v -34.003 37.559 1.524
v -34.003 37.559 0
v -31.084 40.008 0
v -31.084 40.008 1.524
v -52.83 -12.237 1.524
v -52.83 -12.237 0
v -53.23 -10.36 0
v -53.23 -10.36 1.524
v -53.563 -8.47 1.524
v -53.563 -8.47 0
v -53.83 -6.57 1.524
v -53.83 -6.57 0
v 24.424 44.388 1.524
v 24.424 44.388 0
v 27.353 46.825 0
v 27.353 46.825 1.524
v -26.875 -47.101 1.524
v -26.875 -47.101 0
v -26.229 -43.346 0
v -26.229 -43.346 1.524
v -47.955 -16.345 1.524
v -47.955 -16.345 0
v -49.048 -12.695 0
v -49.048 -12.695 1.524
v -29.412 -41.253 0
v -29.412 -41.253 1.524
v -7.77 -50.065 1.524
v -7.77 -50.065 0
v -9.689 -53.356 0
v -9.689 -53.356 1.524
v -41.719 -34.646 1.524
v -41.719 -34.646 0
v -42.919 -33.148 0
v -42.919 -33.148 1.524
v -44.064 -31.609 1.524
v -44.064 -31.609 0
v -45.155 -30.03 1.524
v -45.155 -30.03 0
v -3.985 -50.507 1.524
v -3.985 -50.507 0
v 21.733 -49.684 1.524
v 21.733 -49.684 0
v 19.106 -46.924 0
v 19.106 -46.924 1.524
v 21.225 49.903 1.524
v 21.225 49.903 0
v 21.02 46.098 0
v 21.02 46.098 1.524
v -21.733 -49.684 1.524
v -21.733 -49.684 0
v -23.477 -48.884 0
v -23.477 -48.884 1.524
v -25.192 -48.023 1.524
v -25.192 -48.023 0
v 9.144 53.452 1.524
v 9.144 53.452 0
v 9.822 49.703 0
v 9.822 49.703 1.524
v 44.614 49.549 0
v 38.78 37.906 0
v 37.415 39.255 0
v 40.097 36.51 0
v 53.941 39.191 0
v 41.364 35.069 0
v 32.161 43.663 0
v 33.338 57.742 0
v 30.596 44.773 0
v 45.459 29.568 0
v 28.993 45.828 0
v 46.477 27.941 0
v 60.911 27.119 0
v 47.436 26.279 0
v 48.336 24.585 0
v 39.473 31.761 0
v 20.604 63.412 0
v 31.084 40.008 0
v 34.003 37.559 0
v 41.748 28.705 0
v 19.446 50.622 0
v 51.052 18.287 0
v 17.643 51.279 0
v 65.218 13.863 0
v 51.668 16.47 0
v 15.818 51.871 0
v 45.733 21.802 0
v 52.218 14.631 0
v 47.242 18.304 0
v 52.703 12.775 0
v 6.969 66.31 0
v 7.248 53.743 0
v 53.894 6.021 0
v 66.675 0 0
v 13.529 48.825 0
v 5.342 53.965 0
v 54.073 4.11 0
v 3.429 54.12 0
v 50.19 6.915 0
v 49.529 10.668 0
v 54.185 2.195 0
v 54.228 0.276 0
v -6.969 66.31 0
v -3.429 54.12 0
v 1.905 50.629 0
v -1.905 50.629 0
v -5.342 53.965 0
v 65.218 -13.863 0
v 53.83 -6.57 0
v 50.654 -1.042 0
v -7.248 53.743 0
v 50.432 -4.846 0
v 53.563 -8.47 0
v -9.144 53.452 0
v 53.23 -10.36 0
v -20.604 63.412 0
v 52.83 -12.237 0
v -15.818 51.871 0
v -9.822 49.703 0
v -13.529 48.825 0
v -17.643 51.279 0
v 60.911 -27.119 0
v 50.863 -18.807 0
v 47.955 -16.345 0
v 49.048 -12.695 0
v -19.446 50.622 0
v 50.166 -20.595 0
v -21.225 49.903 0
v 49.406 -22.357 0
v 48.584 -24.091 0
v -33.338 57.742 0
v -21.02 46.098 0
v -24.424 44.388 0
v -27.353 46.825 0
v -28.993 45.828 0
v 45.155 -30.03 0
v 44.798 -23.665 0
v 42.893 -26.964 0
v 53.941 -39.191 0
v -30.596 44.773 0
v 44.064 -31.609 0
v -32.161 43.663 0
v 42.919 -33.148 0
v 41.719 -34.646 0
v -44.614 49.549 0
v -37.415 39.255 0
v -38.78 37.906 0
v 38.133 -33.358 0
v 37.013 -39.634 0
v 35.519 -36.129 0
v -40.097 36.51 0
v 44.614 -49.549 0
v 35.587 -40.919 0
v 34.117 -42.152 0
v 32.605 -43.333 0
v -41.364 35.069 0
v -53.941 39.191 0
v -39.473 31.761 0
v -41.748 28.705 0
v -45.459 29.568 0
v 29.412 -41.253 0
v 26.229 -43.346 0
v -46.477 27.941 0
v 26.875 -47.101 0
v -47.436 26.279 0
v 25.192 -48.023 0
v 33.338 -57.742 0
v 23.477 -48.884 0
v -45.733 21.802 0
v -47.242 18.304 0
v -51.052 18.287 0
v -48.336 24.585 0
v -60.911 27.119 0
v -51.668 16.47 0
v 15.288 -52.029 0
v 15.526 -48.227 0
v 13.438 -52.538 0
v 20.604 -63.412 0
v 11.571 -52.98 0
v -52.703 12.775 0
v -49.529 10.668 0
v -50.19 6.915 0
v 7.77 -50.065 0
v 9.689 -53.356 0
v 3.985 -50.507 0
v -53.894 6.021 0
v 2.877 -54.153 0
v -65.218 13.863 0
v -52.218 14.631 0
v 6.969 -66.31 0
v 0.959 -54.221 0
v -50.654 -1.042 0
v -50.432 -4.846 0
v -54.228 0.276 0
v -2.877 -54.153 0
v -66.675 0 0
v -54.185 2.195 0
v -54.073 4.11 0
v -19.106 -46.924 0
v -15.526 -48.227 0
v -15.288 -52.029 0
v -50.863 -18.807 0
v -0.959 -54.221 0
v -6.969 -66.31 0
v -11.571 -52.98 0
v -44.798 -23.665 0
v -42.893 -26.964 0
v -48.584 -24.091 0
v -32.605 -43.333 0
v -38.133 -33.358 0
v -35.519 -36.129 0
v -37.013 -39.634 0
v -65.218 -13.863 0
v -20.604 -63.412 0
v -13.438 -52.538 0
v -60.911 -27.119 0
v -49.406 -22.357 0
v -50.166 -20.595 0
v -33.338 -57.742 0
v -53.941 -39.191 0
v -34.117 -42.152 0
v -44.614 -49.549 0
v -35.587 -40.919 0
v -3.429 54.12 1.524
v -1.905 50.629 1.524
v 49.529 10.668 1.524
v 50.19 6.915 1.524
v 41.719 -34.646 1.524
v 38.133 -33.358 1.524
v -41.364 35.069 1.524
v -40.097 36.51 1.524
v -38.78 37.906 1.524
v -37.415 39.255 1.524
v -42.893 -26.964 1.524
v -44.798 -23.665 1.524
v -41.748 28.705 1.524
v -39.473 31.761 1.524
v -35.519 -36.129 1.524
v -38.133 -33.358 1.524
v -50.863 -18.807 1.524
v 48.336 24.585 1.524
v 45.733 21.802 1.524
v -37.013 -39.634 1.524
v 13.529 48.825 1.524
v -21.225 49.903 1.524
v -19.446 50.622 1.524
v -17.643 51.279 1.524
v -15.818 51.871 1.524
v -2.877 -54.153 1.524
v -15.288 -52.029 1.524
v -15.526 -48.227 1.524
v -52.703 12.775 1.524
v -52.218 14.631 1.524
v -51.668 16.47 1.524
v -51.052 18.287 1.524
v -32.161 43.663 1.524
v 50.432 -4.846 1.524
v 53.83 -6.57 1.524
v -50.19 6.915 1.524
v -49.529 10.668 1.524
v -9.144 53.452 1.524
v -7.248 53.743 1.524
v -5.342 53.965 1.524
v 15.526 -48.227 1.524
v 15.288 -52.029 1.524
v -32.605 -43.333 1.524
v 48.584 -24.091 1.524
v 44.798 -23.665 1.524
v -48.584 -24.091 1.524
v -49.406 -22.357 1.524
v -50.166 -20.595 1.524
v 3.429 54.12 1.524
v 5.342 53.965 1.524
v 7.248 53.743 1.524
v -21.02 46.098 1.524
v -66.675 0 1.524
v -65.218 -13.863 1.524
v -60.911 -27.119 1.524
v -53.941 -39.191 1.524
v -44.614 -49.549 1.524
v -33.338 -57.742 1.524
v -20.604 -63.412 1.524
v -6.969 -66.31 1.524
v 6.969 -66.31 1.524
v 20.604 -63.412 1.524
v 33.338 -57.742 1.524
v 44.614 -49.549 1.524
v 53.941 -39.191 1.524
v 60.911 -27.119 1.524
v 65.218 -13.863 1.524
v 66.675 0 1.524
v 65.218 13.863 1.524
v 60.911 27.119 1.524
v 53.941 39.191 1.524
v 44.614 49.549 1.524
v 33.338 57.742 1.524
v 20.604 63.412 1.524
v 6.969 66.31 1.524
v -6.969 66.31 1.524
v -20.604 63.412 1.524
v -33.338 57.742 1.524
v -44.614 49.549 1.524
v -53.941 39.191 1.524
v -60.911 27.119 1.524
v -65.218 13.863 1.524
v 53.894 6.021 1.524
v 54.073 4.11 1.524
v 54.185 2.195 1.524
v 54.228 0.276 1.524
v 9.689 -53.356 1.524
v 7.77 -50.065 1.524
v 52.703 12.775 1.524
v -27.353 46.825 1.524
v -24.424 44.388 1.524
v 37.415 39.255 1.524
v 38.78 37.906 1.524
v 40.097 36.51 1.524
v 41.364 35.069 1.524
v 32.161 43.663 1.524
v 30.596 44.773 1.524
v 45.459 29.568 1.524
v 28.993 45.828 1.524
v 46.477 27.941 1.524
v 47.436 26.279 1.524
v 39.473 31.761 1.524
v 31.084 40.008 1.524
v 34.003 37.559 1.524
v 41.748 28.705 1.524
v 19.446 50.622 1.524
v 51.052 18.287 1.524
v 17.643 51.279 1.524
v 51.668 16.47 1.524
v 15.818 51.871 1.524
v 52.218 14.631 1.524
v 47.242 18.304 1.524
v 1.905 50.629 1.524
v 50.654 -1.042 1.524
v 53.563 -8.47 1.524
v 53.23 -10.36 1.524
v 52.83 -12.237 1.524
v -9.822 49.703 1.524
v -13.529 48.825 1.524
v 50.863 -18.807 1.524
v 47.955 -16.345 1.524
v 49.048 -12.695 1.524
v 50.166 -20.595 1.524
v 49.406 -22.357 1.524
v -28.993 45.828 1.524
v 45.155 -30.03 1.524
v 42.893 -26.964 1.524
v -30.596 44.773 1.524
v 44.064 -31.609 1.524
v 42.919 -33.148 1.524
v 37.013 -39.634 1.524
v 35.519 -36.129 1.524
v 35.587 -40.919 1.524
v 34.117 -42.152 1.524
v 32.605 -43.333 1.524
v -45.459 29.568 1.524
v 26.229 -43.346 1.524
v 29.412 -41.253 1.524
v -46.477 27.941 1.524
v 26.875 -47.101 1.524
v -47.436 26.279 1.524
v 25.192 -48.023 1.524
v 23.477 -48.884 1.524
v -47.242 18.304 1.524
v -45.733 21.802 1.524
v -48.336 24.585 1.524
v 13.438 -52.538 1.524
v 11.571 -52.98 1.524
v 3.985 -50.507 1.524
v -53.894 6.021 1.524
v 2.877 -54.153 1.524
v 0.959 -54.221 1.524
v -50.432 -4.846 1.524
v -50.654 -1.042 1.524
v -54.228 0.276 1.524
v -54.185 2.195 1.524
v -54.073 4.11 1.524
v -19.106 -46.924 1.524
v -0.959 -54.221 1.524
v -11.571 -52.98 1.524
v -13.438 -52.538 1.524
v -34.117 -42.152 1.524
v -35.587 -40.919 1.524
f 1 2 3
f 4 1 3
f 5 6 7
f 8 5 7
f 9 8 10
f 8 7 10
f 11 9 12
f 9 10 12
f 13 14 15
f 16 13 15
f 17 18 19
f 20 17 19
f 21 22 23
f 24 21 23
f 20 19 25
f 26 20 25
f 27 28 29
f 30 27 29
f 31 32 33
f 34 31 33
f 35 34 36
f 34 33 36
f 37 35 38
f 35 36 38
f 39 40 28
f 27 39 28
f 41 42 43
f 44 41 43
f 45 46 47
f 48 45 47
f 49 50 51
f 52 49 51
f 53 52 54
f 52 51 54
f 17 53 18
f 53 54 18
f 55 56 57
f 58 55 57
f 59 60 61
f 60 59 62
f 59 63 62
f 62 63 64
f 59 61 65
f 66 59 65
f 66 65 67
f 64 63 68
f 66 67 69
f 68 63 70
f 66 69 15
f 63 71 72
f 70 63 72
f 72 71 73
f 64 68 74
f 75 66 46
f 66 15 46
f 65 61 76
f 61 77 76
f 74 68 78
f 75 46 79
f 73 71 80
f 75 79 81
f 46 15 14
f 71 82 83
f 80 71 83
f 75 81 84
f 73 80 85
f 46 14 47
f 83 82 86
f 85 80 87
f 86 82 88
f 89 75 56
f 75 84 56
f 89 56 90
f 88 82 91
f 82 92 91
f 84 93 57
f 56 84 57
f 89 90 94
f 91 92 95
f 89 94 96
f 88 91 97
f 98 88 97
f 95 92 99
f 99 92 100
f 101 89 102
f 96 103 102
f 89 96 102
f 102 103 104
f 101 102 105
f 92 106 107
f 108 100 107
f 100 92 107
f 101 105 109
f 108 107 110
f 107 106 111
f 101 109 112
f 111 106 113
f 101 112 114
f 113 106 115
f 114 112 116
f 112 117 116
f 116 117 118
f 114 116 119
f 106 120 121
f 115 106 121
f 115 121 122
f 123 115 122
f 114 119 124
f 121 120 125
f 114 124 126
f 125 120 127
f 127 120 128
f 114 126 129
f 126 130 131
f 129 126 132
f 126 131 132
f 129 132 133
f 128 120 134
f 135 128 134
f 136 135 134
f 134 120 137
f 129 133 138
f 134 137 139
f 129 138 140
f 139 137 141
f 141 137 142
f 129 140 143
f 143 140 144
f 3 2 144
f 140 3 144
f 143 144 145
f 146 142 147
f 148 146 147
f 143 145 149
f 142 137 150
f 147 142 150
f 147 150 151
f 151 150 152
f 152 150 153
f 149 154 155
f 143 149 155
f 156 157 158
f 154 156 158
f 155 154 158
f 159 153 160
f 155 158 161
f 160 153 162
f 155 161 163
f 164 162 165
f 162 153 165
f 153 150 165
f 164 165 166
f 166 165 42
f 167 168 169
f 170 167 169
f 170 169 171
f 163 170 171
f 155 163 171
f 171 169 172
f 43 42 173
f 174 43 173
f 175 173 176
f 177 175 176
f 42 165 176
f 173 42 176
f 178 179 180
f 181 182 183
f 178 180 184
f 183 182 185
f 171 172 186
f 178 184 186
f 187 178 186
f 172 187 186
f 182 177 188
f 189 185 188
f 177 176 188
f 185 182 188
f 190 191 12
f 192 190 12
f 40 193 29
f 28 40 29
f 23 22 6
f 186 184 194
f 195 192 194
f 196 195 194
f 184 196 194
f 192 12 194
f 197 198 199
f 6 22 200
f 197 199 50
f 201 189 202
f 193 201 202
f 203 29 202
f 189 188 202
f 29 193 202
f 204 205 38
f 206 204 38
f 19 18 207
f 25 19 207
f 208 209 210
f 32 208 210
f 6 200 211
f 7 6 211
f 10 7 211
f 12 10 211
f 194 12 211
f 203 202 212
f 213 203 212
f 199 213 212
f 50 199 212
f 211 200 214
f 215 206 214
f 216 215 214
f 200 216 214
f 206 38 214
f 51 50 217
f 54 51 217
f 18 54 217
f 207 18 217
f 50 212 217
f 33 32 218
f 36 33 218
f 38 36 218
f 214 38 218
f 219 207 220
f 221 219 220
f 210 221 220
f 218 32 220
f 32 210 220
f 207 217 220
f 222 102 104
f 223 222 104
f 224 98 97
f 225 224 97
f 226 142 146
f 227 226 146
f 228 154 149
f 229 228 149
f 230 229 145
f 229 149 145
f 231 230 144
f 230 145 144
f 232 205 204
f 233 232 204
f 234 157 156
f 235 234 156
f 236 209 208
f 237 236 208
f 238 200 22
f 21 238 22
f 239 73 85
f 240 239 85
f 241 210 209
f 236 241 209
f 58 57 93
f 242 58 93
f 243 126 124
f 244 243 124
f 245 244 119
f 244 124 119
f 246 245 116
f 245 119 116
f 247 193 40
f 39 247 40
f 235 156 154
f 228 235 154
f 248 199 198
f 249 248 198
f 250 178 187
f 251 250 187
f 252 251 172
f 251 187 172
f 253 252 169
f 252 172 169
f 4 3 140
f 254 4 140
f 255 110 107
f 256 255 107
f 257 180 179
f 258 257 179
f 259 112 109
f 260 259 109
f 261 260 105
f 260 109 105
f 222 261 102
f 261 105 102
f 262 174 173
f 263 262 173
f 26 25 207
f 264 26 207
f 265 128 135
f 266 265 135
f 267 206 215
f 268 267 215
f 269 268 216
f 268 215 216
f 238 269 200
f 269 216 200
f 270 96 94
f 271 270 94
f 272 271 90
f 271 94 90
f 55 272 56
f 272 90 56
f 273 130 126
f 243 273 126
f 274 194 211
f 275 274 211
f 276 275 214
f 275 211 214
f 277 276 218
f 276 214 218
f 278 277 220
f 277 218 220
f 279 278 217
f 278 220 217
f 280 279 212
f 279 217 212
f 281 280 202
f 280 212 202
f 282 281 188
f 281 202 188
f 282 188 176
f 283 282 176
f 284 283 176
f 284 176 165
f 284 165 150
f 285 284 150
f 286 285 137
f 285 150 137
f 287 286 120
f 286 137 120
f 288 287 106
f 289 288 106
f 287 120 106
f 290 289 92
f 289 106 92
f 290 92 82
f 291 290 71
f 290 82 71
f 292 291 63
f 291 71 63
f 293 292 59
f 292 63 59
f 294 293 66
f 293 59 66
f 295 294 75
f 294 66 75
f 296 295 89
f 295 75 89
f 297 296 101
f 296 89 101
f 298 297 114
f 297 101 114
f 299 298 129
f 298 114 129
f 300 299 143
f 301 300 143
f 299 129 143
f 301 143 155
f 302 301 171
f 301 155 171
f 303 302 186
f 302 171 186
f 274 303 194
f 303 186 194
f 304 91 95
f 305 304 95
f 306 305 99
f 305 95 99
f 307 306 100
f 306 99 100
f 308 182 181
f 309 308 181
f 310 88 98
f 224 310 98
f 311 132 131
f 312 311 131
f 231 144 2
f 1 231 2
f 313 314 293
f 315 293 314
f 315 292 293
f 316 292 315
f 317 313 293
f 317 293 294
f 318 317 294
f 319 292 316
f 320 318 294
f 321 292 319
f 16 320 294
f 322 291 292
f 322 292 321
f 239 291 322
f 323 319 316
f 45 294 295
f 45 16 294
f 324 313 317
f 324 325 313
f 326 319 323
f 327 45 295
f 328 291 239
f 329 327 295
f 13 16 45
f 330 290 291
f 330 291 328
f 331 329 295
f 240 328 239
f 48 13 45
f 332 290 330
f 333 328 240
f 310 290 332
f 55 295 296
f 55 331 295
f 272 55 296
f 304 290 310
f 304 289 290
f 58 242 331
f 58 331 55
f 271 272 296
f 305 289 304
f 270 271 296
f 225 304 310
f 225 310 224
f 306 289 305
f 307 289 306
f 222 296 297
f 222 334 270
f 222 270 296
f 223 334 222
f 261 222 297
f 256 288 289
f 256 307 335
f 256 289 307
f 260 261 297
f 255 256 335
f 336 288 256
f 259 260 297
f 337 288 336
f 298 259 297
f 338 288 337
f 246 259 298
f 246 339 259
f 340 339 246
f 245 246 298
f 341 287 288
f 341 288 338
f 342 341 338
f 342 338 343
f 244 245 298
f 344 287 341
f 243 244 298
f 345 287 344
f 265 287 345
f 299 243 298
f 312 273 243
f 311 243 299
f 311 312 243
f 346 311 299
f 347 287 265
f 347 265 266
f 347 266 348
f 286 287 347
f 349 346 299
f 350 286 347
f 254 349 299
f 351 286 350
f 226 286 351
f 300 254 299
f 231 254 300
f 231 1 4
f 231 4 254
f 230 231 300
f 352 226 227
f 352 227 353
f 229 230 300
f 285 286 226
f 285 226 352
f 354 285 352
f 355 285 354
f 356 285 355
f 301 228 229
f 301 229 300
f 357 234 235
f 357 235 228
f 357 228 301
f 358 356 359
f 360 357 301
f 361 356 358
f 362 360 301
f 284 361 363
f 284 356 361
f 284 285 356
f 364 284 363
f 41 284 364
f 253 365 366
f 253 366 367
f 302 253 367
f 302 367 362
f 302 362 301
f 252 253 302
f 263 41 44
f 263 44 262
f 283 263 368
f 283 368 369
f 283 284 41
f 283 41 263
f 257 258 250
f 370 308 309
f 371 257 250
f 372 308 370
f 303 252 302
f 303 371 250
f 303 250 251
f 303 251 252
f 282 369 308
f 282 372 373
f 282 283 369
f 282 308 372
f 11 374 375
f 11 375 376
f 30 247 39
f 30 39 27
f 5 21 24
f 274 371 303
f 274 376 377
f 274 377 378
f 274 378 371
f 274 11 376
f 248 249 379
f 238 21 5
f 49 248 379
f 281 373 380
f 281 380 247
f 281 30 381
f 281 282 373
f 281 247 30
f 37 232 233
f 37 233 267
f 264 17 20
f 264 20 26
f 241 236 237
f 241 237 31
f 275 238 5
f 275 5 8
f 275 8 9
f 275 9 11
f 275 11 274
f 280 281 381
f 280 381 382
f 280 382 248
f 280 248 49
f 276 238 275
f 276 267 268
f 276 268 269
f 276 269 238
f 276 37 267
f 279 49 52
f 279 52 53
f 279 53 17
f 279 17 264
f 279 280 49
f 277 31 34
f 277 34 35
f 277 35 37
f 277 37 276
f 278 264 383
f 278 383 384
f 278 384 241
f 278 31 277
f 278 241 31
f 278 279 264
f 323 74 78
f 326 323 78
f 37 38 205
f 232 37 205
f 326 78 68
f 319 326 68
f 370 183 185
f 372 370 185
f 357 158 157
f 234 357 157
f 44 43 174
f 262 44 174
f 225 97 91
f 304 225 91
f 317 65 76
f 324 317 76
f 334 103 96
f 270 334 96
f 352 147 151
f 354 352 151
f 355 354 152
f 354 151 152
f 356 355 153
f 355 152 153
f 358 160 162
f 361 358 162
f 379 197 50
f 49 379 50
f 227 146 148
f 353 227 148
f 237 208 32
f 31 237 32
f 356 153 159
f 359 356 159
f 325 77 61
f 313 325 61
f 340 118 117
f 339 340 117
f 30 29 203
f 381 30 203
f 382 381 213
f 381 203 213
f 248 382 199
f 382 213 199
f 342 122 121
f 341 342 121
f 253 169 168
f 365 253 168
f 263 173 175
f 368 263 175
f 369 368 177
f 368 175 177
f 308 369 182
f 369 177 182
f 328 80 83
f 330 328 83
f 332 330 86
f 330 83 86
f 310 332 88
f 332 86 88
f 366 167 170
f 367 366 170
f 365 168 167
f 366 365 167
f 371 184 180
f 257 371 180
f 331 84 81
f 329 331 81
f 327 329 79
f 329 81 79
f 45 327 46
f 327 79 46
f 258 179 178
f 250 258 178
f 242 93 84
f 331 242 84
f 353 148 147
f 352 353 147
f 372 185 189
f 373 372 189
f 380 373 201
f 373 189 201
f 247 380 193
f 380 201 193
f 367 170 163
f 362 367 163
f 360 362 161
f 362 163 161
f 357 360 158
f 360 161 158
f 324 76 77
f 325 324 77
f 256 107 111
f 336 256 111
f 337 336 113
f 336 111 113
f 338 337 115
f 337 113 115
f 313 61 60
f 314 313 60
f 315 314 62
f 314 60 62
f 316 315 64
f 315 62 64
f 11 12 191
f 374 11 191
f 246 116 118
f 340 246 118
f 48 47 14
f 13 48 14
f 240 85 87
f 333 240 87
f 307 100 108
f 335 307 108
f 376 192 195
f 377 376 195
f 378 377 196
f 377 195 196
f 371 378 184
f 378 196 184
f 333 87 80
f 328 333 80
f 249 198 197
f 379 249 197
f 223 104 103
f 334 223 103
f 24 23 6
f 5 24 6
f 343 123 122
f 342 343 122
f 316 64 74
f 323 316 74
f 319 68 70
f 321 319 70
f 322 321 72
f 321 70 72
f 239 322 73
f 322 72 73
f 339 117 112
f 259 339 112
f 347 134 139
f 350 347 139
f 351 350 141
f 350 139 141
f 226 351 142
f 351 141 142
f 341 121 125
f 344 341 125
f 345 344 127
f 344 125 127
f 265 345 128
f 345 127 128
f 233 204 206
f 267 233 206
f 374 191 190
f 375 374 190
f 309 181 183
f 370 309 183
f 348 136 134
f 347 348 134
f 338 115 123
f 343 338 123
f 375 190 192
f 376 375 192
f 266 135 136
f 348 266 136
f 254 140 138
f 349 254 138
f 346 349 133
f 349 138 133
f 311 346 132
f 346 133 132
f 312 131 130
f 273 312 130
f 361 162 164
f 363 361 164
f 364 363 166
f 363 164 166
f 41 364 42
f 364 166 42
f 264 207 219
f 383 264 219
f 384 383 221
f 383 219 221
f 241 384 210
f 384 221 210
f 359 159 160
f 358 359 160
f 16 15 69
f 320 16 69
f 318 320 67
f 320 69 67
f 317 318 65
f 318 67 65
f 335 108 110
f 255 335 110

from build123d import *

# Parameters (mm, degrees)
SKETCH1_R           = 66.675
BOSS_EXTRUDE1_DEPTH = 1.524


with BuildPart() as part:
    # Sketch1 → Boss-Extrude1 (new body)
    with BuildSketch(Plane.XY):
        with Locations(Location((0, 0, 0), (0, 0, 180))):
            Circle(SKETCH1_R)
        with BuildLine():
            Line((-3.429, 54.120480412), (-1.905, 50.628557732))
            Line((-1.905, 50.628557732), (1.905, 50.628557732))
            Line((1.905, 50.628557732), (3.429, 54.120480412))
            ThreePointArc((3.429, 54.120480412), (6.29560264, 53.862322902), (9.144470854, 53.452437679))
            Line((9.144470854, 53.452437679), (9.822098447, 49.70318164))
            Line((9.822098447, 49.70318164), (13.529399404, 48.824535172))
            Line((13.529399404, 48.824535172), (15.817612576, 51.870874037))
            ThreePointArc((15.817612576, 51.870874037), (18.547410352, 50.958591133), (21.224960917, 49.902760195))
            Line((21.224960917, 49.902760195), (21.019685025, 46.09829416))
            Line((21.019685025, 46.09829416), (24.424425385, 44.388369284))
            Line((24.424425385, 44.388369284), (27.353493565, 46.824895417))
            ThreePointArc((27.353493565, 46.824895417), (29.799322372, 45.307668525), (32.161207844, 43.662811992))
            Line((32.161207844, 43.662811992), (31.084094942, 40.00823571))
            Line((31.084094942, 40.00823571), (34.002724271, 37.559214917))
            Line((34.002724271, 37.559214917), (37.414740634, 39.254574565))
            ThreePointArc((37.414740634, 39.254574565), (39.444745209, 37.21419778), (41.36363573, 35.068990293))
            Line((41.36363573, 35.068990293), (39.472753256, 31.761322918))
            Line((39.472753256, 31.761322918), (41.74792749, 28.705233553))
            Line((41.74792749, 28.705233553), (45.458949352, 29.568029437))
            ThreePointArc((45.458949352, 29.568029437), (46.963691622, 27.1145), (48.336139308, 24.58459025))
            Line((48.336139308, 24.58459025), (45.733425224, 21.802148985))
            Line((45.733425224, 21.802148985), (47.242489132, 18.303745618))
            Line((47.242489132, 18.303745618), (51.052454344, 18.287464189))
            ThreePointArc((51.052454344, 18.287464189), (51.950813263, 15.553052507), (52.702829105, 12.774828583))
            Line((52.702829105, 12.774828583), (49.5285964, 10.667615558))
            Line((49.5285964, 10.667615558), (50.190195957, 6.915498019))
            Line((50.190195957, 6.915498019), (53.893708307, 6.021017013))
            ThreePointArc((53.893708307, 6.021017013), (54.137253115, 3.153135927), (54.228295743, 0.276372601))
            Line((54.228295743, 0.276372601), (50.653668125, -1.042011786))
            Line((50.653668125, -1.042011786), (50.432136326, -4.845565869))
            Line((50.432136326, -4.845565869), (53.829538506, -6.570024749))
            ThreePointArc((53.829538506, -6.570024749), (53.405139638, -9.416767027), (52.830300921, -12.2369827))
            Line((52.830300921, -12.2369827), (49.047987489, -12.695464004))
            Line((49.047987489, -12.695464004), (47.955267173, -16.345404046))
            Line((47.955267173, -16.345404046), (50.863404351, -18.806874776))
            ThreePointArc((50.863404351, -18.806874776), (49.79394126, -21.479009633), (48.584210902, -24.090639096))
            Line((48.584210902, -24.090639096), (44.798117153, -23.664500472))
            Line((44.798117153, -23.664500472), (42.893117153, -26.96405726))
            Line((42.893117153, -26.96405726), (45.155210902, -30.029841315))
            ThreePointArc((45.155210902, -30.029841315), (43.49833862, -32.383313269), (41.718933497, -34.645562903))
            Line((41.718933497, -34.645562903), (38.133168725, -33.357777594))
            Line((38.133168725, -33.357777594), (35.518588085, -36.129071168))
            Line((35.518588085, -36.129071168), (37.012688345, -39.633891337))
            ThreePointArc((37.012688345, -39.633891337), (34.857729286, -41.541824106), (32.604577589, -43.332735446))
            Line((32.604577589, -43.332735446), (29.412451301, -41.252728291))
            Line((29.412451301, -41.252728291), (26.22924274, -43.346357498))
            Line((26.22924274, -43.346357498), (26.874802178, -47.101268018))
            ThreePointArc((26.874802178, -47.101268018), (24.337930743, -48.460804452), (21.732500464, -49.683829005))
            Line((21.732500464, -49.683829005), (19.106101015, -46.923733729))
            Line((19.106101015, -46.923733729), (15.525872129, -48.226830475))
            Line((15.525872129, -48.226830475), (15.288088471, -52.029403148))
            ThreePointArc((15.288088471, -52.029403148), (12.506068054, -52.767250287), (9.688818614, -53.356454482))
            Line((9.688818614, -53.356454482), (7.769735877, -50.065068535))
            Line((7.769735877, -50.065068535), (3.985497734, -50.507382538))
            Line((3.985497734, -50.507382538), (2.877189956, -54.152619687))
            ThreePointArc((2.877189956, -54.152619687), (0, -54.229), (-2.877189956, -54.152619687))
            Line((-2.877189956, -54.152619687), (-3.985497734, -50.507382538))
            Line((-3.985497734, -50.507382538), (-7.769735877, -50.065068535))
            Line((-7.769735877, -50.065068535), (-9.688818614, -53.356454482))
            ThreePointArc((-9.688818614, -53.356454482), (-12.506068054, -52.767250287), (-15.288088471, -52.029403148))
            Line((-15.288088471, -52.029403148), (-15.525872129, -48.226830475))
            Line((-15.525872129, -48.226830475), (-19.106101015, -46.923733729))
            Line((-19.106101015, -46.923733729), (-21.732500464, -49.683829005))
            ThreePointArc((-21.732500464, -49.683829005), (-24.337930743, -48.460804452), (-26.874802178, -47.101268018))
            Line((-26.874802178, -47.101268018), (-26.22924274, -43.346357498))
            Line((-26.22924274, -43.346357498), (-29.412451301, -41.252728291))
            Line((-29.412451301, -41.252728291), (-32.604577589, -43.332735446))
            ThreePointArc((-32.604577589, -43.332735446), (-34.857729286, -41.541824106), (-37.012688345, -39.633891337))
            Line((-37.012688345, -39.633891337), (-35.518588085, -36.129071168))
            Line((-35.518588085, -36.129071168), (-38.133168725, -33.357777594))
            Line((-38.133168725, -33.357777594), (-41.718933497, -34.645562903))
            ThreePointArc((-41.718933497, -34.645562903), (-43.49833862, -32.383313269), (-45.155210902, -30.029841315))
            Line((-45.155210902, -30.029841315), (-42.893117153, -26.96405726))
            Line((-42.893117153, -26.96405726), (-44.798117153, -23.664500472))
            Line((-44.798117153, -23.664500472), (-48.584210902, -24.090639096))
            ThreePointArc((-48.584210902, -24.090639096), (-49.79394126, -21.479009633), (-50.863404351, -18.806874776))
            Line((-50.863404351, -18.806874776), (-47.955267173, -16.345404046))
            Line((-47.955267173, -16.345404046), (-49.047987489, -12.695464004))
            Line((-49.047987489, -12.695464004), (-52.830300921, -12.2369827))
            ThreePointArc((-52.830300921, -12.2369827), (-53.405139638, -9.416767027), (-53.829538506, -6.570024749))
            Line((-53.829538506, -6.570024749), (-50.432136326, -4.845565869))
            Line((-50.432136326, -4.845565869), (-50.653668125, -1.042011786))
            Line((-50.653668125, -1.042011786), (-54.228295743, 0.276372601))
            ThreePointArc((-54.228295743, 0.276372601), (-54.137253115, 3.153135927), (-53.893708307, 6.021017013))
            Line((-53.893708307, 6.021017013), (-50.190195957, 6.915498019))
            Line((-50.190195957, 6.915498019), (-49.5285964, 10.667615558))
            Line((-49.5285964, 10.667615558), (-52.702829105, 12.774828583))
            ThreePointArc((-52.702829105, 12.774828583), (-51.950813263, 15.553052507), (-51.052454344, 18.287464189))
            Line((-51.052454344, 18.287464189), (-47.242489132, 18.303745618))
            Line((-47.242489132, 18.303745618), (-45.733425224, 21.802148985))
            Line((-45.733425224, 21.802148985), (-48.336139308, 24.58459025))
            ThreePointArc((-48.336139308, 24.58459025), (-46.963691622, 27.1145), (-45.458949352, 29.568029437))
            Line((-45.458949352, 29.568029437), (-41.74792749, 28.705233553))
            Line((-41.74792749, 28.705233553), (-39.472753256, 31.761322918))
            Line((-39.472753256, 31.761322918), (-41.36363573, 35.068990293))
            ThreePointArc((-41.36363573, 35.068990293), (-39.444745209, 37.21419778), (-37.414740634, 39.254574565))
            Line((-37.414740634, 39.254574565), (-34.002724271, 37.559214917))
            Line((-34.002724271, 37.559214917), (-31.084094942, 40.00823571))
            Line((-31.084094942, 40.00823571), (-32.161207844, 43.662811992))
            ThreePointArc((-32.161207844, 43.662811992), (-29.799322372, 45.307668525), (-27.353493565, 46.824895417))
            Line((-27.353493565, 46.824895417), (-24.424425385, 44.388369284))
            Line((-24.424425385, 44.388369284), (-21.019685025, 46.09829416))
            Line((-21.019685025, 46.09829416), (-21.224960917, 49.902760195))
            ThreePointArc((-21.224960917, 49.902760195), (-18.547410352, 50.958591133), (-15.817612576, 51.870874037))
            Line((-15.817612576, 51.870874037), (-13.529399404, 48.824535172))
            Line((-13.529399404, 48.824535172), (-9.822098447, 49.70318164))
            Line((-9.822098447, 49.70318164), (-9.144470854, 53.452437679))
            ThreePointArc((-9.144470854, 53.452437679), (-6.29560264, 53.862322902), (-3.429, 54.120480412))
        make_face(mode=Mode.SUBTRACT)
    extrude(amount=BOSS_EXTRUDE1_DEPTH)


solid = part.part
